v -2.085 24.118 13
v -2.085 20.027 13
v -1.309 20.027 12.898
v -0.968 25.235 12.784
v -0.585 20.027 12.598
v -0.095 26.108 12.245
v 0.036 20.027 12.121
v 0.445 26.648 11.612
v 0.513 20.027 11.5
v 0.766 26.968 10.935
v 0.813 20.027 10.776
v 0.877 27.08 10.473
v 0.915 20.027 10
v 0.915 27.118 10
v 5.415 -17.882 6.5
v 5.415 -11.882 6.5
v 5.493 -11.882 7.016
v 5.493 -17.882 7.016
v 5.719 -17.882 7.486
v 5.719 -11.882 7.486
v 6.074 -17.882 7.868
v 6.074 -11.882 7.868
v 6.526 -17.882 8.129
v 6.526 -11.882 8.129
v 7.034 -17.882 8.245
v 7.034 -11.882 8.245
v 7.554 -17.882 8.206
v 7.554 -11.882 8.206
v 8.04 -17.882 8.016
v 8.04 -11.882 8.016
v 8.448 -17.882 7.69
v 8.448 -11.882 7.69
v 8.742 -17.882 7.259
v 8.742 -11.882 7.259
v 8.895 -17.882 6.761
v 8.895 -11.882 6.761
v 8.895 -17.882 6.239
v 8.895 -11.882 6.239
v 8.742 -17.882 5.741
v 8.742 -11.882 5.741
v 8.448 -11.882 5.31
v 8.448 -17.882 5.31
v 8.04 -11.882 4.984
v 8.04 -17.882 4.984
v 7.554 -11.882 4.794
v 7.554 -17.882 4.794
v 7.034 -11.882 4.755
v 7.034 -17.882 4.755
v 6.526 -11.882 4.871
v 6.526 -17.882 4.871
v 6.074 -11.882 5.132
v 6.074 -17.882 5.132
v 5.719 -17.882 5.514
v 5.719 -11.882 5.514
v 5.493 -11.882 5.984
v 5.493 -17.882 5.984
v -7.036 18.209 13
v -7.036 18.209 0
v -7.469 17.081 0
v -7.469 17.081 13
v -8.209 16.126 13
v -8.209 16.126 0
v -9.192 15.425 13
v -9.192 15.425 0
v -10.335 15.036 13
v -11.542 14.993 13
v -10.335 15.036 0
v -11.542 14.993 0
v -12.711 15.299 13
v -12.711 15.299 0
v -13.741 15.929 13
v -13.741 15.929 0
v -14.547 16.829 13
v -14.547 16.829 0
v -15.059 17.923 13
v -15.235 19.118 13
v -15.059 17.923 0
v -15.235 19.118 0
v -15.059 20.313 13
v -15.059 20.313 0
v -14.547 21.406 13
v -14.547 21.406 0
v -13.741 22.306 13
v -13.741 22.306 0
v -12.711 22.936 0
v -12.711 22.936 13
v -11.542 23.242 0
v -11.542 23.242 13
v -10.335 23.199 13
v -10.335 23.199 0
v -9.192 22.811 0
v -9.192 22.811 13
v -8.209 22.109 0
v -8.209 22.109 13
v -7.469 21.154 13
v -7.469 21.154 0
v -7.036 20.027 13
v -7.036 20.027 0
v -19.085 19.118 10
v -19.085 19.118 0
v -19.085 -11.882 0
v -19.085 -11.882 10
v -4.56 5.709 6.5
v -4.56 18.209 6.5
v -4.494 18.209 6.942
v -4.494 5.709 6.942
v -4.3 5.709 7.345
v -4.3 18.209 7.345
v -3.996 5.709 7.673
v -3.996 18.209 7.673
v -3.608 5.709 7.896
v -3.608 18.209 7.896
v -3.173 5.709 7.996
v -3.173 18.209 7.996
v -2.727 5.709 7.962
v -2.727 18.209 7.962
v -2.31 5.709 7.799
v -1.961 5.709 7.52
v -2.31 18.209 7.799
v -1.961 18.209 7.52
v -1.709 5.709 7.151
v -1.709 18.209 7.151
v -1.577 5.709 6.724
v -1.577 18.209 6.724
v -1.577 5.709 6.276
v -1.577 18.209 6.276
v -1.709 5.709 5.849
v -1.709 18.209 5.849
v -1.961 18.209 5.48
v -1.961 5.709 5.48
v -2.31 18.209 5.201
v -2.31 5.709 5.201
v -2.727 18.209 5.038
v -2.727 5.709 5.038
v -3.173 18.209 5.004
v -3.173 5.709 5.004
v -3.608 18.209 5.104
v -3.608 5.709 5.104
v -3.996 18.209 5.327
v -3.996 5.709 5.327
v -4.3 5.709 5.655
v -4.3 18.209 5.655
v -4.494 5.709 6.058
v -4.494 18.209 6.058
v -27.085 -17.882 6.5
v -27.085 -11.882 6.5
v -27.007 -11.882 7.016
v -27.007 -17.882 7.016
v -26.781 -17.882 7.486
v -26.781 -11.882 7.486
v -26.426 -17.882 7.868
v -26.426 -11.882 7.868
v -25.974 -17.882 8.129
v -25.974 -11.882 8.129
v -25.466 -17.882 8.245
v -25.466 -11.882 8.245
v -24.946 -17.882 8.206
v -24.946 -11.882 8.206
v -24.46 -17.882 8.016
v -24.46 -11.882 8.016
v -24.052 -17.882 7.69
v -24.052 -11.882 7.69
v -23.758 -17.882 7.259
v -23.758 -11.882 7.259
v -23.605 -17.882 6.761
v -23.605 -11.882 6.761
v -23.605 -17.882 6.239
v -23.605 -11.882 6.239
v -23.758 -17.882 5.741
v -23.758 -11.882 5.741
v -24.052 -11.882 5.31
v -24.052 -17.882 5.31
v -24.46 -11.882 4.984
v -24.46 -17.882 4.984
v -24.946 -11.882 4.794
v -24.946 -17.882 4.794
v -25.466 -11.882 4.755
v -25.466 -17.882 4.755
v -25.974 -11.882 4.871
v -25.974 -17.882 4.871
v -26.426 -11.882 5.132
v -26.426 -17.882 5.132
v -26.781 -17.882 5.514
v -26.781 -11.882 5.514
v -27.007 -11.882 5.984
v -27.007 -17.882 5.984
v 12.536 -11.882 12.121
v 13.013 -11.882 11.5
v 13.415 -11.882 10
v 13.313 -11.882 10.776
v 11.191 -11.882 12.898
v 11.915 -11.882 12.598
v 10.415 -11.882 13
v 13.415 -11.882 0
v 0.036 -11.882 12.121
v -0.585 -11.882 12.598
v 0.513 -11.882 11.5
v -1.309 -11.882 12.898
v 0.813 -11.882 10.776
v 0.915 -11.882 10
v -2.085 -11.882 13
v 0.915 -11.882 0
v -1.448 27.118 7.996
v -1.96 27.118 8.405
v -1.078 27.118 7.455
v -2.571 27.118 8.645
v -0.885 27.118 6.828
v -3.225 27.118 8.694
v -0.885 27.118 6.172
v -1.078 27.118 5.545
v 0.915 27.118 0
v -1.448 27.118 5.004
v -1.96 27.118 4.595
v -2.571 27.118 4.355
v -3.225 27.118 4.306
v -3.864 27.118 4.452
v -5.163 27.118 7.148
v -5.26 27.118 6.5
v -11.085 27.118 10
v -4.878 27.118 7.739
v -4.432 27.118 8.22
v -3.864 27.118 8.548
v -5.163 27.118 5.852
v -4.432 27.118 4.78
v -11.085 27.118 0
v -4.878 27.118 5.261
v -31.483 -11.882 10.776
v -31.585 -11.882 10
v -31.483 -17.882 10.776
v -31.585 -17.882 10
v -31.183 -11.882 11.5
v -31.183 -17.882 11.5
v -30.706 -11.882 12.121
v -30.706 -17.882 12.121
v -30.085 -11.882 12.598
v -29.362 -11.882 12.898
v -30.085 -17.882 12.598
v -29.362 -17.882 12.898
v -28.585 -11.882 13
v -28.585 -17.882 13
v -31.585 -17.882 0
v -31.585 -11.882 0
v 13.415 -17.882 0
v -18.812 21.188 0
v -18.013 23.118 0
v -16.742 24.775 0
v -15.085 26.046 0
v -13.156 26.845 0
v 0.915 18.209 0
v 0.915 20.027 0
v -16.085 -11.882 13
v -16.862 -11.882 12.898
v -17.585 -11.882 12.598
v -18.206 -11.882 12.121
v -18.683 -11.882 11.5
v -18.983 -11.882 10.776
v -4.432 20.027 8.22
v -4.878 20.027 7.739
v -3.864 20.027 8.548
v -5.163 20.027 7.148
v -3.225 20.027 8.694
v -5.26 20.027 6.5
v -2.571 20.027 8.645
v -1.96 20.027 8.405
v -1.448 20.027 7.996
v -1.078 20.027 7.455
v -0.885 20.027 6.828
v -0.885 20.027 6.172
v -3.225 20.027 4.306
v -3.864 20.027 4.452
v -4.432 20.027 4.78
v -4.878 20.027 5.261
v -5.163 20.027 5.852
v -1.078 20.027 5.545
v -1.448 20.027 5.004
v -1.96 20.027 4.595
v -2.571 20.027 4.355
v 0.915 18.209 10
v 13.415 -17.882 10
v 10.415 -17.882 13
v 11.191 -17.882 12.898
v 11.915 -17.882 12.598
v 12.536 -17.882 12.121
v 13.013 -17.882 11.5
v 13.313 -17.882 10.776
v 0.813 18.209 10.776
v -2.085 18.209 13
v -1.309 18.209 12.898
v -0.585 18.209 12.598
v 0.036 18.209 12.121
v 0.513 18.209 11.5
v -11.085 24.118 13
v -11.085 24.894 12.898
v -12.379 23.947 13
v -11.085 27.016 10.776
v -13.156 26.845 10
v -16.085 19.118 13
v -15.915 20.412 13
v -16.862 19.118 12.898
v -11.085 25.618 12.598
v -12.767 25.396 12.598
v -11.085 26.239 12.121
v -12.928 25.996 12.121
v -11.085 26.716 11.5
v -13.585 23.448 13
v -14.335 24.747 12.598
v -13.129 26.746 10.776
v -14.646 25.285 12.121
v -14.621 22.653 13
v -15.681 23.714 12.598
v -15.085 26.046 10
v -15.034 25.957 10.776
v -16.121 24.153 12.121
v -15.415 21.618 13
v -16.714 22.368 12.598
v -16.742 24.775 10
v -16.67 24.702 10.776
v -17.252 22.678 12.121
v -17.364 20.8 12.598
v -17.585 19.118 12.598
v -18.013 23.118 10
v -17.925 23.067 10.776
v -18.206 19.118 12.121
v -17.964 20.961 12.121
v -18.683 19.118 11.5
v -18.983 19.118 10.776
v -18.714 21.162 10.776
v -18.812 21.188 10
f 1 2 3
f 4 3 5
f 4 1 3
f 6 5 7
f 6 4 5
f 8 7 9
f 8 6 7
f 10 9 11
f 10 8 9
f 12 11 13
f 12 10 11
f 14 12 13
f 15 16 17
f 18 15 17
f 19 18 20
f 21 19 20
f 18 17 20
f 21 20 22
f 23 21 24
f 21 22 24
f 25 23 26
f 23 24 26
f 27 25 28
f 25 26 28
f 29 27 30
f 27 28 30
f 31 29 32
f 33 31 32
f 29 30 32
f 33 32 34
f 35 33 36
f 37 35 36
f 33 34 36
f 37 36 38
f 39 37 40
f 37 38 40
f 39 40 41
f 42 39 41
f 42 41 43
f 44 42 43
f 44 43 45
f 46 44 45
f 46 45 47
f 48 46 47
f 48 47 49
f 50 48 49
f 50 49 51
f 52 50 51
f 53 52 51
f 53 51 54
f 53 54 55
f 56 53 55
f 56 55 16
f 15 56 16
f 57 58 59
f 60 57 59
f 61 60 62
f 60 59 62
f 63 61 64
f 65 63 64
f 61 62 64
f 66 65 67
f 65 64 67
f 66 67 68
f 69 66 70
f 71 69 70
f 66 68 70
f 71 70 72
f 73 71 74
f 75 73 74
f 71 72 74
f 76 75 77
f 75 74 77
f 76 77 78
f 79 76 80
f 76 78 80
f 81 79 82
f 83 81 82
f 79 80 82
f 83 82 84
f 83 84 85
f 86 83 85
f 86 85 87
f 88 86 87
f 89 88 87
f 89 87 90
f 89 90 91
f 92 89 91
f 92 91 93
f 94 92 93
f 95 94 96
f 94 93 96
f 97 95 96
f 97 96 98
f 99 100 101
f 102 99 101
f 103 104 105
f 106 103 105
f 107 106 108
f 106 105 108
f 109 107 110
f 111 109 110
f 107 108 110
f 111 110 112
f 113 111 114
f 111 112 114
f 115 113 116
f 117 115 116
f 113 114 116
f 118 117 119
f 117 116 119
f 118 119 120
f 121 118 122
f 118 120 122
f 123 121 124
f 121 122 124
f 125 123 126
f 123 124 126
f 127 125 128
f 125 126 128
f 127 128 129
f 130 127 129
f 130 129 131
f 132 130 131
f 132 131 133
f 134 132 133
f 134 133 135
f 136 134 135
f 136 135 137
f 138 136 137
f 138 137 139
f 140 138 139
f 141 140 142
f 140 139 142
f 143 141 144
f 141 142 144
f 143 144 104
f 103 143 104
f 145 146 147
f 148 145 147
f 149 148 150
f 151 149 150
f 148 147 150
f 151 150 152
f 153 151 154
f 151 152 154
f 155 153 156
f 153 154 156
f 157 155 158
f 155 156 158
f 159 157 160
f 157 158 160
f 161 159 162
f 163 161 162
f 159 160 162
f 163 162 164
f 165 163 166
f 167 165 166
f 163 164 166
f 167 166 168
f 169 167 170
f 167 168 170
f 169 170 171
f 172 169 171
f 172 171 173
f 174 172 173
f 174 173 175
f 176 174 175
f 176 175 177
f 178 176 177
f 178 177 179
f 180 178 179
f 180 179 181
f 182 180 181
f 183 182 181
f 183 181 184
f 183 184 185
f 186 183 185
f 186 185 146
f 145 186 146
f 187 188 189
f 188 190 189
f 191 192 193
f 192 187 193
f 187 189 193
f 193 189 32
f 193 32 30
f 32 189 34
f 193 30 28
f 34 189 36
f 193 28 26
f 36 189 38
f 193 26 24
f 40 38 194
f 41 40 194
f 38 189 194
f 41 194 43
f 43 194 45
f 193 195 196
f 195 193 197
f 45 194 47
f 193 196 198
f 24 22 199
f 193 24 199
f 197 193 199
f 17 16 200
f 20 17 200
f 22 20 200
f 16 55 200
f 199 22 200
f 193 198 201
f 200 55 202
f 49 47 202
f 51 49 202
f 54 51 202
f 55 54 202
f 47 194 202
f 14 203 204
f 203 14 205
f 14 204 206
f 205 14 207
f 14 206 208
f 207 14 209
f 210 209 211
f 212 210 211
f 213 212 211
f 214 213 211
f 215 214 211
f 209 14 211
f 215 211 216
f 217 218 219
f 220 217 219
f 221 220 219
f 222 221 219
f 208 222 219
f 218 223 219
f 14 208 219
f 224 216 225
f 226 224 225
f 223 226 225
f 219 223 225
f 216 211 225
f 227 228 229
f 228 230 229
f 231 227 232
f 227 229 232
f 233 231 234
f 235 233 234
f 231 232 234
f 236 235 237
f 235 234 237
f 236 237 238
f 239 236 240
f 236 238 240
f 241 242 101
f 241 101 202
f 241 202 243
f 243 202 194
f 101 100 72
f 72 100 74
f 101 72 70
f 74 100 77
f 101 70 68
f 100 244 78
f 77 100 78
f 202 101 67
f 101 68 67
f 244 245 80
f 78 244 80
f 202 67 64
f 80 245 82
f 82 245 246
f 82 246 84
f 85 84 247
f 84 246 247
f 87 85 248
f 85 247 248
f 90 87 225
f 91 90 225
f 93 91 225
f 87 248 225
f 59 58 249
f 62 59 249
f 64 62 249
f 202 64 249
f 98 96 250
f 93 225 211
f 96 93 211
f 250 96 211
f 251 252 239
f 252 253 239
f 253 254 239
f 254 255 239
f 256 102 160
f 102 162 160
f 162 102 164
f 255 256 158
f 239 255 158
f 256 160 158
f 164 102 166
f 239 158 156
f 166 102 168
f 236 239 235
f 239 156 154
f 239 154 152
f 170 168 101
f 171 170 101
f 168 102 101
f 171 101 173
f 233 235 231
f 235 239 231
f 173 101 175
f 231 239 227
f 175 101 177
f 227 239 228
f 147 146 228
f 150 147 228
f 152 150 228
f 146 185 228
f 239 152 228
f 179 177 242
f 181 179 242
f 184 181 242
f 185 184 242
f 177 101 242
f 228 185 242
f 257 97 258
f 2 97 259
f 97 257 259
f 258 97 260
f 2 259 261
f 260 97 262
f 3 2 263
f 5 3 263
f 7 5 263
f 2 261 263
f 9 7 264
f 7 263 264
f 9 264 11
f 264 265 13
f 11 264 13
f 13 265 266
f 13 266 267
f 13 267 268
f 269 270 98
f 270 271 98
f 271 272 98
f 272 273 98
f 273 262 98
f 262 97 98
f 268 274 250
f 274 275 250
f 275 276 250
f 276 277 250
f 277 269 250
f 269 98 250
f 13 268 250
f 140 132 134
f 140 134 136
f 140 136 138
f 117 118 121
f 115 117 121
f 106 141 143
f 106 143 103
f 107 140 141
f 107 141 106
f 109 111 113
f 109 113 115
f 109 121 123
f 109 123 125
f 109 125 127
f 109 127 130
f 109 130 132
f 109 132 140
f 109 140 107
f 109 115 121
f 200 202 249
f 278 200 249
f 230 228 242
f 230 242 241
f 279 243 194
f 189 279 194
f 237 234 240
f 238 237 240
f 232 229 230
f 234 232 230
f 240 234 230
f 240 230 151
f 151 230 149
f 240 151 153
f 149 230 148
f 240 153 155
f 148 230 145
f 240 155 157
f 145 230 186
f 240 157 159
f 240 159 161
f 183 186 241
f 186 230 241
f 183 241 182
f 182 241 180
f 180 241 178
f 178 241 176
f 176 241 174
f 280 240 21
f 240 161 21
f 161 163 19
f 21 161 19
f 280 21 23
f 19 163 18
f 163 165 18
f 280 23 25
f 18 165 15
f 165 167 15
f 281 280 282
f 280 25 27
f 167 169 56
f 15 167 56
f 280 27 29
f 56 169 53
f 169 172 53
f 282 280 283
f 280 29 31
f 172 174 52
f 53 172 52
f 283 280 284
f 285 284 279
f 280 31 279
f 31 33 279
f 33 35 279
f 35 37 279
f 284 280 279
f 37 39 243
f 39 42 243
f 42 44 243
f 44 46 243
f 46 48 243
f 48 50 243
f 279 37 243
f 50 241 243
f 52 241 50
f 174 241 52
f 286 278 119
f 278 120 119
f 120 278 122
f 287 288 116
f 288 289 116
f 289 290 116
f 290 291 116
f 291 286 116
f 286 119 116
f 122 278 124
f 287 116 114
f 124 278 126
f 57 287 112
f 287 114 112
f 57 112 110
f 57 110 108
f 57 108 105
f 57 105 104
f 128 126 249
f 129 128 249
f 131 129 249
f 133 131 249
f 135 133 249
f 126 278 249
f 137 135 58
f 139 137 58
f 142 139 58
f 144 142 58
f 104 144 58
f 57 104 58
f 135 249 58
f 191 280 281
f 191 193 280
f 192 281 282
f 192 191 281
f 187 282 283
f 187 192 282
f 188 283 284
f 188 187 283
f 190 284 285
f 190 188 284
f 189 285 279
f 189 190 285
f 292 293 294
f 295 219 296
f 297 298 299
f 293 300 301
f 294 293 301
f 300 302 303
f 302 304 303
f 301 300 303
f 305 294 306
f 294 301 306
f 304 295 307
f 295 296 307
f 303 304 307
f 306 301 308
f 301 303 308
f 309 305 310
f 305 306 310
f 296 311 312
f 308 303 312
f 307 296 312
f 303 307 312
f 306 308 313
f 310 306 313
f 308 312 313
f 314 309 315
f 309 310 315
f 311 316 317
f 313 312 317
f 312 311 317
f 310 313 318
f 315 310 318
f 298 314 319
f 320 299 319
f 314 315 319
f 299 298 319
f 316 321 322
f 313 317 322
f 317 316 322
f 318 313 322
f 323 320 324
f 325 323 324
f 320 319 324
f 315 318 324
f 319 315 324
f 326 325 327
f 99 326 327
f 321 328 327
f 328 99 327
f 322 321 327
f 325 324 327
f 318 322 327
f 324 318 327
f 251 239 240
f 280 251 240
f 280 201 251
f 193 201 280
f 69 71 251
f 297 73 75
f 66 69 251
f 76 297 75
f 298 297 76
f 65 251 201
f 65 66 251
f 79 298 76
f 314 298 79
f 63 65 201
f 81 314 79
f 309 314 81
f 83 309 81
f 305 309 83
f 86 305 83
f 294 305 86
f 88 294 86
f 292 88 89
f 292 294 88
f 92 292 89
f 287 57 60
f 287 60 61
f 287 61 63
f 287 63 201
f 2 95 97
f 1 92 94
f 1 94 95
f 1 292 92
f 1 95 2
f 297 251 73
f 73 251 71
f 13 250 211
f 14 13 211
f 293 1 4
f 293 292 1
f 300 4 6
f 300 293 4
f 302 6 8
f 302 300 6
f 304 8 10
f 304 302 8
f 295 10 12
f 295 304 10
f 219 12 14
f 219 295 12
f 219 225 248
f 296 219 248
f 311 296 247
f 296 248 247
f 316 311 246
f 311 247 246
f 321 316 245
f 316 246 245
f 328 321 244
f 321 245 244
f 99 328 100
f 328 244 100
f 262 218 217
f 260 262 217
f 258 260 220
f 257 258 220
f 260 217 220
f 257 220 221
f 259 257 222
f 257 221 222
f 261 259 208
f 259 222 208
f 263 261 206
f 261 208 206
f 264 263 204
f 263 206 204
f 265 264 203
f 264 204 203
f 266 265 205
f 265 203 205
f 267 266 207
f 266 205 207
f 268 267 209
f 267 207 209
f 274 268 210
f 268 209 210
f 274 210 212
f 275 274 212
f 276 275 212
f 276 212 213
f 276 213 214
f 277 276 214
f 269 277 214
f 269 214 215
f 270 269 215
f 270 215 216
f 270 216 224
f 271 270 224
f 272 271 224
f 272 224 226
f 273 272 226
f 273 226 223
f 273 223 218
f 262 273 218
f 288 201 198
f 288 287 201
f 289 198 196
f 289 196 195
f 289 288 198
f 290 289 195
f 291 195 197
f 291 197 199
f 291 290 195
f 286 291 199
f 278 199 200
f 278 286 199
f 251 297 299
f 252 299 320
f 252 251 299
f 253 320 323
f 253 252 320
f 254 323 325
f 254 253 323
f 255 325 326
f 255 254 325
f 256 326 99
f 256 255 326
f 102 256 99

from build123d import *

# Parameters (mm, degrees)
F1_DEPTH = 13
F2_R     = 1.5
F3_DEPTH = 12.5
F4_R     = 2.2
F5_DEPTH = 8
F7_R     = 1.75
F6_R     = 1.75
F8_DEPTH = 25
F9_R     = 3


with BuildPart() as f1:
    # F0 (on Top) → F1 (new body)
    with BuildSketch(Plane.XY):
        with BuildLine():
            Line((-31.585052, -11.882249), (-31.585052, -17.882249))
            Line((-31.585052, -17.882249), (13.414948, -17.882249))
            Line((13.414948, -17.882249), (13.414948, -11.882249))
            Line((13.414948, -11.882249), (0.914948, -11.882249))
            Line((0.914948, -11.882249), (0.914948, 18.208811))
            Line((0.914948, 18.208811), (-7.035814, 18.208811))
            ThreePointArc((-7.035814, 18.208811), (-15.235052, 19.117751), (-7.035814, 20.02669))
            Line((-7.035814, 20.02669), (0.914948, 20.02669))
            Line((0.914948, 20.02669), (0.914948, 27.117751))
            Line((0.914948, 27.117751), (-11.085052, 27.117751))
            ThreePointArc((-11.085052, 27.117751), (-16.741906, 24.774605), (-19.085052, 19.117751))
            Line((-19.085052, 19.117751), (-19.085052, -11.882249))
            Line((-19.085052, -11.882249), (-31.585052, -11.882249))
        make_face()
    extrude(amount=F1_DEPTH)

    # F2 (on face) → F3 (cut, symmetric)
    with BuildSketch(Plane(origin=(0, 18.208811, 0), x_dir=(-1, 0, 0), z_dir=(0, 1, 0))):
        with Locations((3.060433, 6.5)):
            Circle(F2_R)
    extrude(amount=F3_DEPTH, both=True, mode=Mode.SUBTRACT)

    # F4 (on face) → F5 (cut)
    with BuildSketch(Plane(origin=(0, 27.117751, 0), x_dir=(-1, 0, 0), z_dir=(0, 1, 0))):
        with Locations((3.060433, 6.5)):
            Circle(F4_R)
    extrude(amount=-F5_DEPTH, mode=Mode.SUBTRACT)

    # F7 (on face) + F6 (on face) → F8 (cut)
    with BuildSketch(Plane(origin=(0, -11.882249, 0), x_dir=(-1, 0, 0), z_dir=(0, 1, 0))):
        with Locations((25.335052, 6.5)):
            Circle(F7_R)
    with BuildSketch(Plane(origin=(0, -11.882249, 0), x_dir=(-1, 0, 0), z_dir=(0, 1, 0))):
        with Locations((-7.164948, 6.5)):
            Circle(F6_R)
    extrude(amount=-F8_DEPTH, mode=Mode.SUBTRACT)

    # F9
    f9_edges = [f1.edges().sort_by_distance(p)[0] for p in [
        (13.414948, -14.882249, 13),
        (-31.585052, -14.882249, 13),
        (0.914948, 3.163281, 13),
        (0.914948, 23.57222, 13),
        (-19.085052, 3.617751, 13),
    ]]
    fillet(f9_edges, radius=F9_R)


solid = f1.part
